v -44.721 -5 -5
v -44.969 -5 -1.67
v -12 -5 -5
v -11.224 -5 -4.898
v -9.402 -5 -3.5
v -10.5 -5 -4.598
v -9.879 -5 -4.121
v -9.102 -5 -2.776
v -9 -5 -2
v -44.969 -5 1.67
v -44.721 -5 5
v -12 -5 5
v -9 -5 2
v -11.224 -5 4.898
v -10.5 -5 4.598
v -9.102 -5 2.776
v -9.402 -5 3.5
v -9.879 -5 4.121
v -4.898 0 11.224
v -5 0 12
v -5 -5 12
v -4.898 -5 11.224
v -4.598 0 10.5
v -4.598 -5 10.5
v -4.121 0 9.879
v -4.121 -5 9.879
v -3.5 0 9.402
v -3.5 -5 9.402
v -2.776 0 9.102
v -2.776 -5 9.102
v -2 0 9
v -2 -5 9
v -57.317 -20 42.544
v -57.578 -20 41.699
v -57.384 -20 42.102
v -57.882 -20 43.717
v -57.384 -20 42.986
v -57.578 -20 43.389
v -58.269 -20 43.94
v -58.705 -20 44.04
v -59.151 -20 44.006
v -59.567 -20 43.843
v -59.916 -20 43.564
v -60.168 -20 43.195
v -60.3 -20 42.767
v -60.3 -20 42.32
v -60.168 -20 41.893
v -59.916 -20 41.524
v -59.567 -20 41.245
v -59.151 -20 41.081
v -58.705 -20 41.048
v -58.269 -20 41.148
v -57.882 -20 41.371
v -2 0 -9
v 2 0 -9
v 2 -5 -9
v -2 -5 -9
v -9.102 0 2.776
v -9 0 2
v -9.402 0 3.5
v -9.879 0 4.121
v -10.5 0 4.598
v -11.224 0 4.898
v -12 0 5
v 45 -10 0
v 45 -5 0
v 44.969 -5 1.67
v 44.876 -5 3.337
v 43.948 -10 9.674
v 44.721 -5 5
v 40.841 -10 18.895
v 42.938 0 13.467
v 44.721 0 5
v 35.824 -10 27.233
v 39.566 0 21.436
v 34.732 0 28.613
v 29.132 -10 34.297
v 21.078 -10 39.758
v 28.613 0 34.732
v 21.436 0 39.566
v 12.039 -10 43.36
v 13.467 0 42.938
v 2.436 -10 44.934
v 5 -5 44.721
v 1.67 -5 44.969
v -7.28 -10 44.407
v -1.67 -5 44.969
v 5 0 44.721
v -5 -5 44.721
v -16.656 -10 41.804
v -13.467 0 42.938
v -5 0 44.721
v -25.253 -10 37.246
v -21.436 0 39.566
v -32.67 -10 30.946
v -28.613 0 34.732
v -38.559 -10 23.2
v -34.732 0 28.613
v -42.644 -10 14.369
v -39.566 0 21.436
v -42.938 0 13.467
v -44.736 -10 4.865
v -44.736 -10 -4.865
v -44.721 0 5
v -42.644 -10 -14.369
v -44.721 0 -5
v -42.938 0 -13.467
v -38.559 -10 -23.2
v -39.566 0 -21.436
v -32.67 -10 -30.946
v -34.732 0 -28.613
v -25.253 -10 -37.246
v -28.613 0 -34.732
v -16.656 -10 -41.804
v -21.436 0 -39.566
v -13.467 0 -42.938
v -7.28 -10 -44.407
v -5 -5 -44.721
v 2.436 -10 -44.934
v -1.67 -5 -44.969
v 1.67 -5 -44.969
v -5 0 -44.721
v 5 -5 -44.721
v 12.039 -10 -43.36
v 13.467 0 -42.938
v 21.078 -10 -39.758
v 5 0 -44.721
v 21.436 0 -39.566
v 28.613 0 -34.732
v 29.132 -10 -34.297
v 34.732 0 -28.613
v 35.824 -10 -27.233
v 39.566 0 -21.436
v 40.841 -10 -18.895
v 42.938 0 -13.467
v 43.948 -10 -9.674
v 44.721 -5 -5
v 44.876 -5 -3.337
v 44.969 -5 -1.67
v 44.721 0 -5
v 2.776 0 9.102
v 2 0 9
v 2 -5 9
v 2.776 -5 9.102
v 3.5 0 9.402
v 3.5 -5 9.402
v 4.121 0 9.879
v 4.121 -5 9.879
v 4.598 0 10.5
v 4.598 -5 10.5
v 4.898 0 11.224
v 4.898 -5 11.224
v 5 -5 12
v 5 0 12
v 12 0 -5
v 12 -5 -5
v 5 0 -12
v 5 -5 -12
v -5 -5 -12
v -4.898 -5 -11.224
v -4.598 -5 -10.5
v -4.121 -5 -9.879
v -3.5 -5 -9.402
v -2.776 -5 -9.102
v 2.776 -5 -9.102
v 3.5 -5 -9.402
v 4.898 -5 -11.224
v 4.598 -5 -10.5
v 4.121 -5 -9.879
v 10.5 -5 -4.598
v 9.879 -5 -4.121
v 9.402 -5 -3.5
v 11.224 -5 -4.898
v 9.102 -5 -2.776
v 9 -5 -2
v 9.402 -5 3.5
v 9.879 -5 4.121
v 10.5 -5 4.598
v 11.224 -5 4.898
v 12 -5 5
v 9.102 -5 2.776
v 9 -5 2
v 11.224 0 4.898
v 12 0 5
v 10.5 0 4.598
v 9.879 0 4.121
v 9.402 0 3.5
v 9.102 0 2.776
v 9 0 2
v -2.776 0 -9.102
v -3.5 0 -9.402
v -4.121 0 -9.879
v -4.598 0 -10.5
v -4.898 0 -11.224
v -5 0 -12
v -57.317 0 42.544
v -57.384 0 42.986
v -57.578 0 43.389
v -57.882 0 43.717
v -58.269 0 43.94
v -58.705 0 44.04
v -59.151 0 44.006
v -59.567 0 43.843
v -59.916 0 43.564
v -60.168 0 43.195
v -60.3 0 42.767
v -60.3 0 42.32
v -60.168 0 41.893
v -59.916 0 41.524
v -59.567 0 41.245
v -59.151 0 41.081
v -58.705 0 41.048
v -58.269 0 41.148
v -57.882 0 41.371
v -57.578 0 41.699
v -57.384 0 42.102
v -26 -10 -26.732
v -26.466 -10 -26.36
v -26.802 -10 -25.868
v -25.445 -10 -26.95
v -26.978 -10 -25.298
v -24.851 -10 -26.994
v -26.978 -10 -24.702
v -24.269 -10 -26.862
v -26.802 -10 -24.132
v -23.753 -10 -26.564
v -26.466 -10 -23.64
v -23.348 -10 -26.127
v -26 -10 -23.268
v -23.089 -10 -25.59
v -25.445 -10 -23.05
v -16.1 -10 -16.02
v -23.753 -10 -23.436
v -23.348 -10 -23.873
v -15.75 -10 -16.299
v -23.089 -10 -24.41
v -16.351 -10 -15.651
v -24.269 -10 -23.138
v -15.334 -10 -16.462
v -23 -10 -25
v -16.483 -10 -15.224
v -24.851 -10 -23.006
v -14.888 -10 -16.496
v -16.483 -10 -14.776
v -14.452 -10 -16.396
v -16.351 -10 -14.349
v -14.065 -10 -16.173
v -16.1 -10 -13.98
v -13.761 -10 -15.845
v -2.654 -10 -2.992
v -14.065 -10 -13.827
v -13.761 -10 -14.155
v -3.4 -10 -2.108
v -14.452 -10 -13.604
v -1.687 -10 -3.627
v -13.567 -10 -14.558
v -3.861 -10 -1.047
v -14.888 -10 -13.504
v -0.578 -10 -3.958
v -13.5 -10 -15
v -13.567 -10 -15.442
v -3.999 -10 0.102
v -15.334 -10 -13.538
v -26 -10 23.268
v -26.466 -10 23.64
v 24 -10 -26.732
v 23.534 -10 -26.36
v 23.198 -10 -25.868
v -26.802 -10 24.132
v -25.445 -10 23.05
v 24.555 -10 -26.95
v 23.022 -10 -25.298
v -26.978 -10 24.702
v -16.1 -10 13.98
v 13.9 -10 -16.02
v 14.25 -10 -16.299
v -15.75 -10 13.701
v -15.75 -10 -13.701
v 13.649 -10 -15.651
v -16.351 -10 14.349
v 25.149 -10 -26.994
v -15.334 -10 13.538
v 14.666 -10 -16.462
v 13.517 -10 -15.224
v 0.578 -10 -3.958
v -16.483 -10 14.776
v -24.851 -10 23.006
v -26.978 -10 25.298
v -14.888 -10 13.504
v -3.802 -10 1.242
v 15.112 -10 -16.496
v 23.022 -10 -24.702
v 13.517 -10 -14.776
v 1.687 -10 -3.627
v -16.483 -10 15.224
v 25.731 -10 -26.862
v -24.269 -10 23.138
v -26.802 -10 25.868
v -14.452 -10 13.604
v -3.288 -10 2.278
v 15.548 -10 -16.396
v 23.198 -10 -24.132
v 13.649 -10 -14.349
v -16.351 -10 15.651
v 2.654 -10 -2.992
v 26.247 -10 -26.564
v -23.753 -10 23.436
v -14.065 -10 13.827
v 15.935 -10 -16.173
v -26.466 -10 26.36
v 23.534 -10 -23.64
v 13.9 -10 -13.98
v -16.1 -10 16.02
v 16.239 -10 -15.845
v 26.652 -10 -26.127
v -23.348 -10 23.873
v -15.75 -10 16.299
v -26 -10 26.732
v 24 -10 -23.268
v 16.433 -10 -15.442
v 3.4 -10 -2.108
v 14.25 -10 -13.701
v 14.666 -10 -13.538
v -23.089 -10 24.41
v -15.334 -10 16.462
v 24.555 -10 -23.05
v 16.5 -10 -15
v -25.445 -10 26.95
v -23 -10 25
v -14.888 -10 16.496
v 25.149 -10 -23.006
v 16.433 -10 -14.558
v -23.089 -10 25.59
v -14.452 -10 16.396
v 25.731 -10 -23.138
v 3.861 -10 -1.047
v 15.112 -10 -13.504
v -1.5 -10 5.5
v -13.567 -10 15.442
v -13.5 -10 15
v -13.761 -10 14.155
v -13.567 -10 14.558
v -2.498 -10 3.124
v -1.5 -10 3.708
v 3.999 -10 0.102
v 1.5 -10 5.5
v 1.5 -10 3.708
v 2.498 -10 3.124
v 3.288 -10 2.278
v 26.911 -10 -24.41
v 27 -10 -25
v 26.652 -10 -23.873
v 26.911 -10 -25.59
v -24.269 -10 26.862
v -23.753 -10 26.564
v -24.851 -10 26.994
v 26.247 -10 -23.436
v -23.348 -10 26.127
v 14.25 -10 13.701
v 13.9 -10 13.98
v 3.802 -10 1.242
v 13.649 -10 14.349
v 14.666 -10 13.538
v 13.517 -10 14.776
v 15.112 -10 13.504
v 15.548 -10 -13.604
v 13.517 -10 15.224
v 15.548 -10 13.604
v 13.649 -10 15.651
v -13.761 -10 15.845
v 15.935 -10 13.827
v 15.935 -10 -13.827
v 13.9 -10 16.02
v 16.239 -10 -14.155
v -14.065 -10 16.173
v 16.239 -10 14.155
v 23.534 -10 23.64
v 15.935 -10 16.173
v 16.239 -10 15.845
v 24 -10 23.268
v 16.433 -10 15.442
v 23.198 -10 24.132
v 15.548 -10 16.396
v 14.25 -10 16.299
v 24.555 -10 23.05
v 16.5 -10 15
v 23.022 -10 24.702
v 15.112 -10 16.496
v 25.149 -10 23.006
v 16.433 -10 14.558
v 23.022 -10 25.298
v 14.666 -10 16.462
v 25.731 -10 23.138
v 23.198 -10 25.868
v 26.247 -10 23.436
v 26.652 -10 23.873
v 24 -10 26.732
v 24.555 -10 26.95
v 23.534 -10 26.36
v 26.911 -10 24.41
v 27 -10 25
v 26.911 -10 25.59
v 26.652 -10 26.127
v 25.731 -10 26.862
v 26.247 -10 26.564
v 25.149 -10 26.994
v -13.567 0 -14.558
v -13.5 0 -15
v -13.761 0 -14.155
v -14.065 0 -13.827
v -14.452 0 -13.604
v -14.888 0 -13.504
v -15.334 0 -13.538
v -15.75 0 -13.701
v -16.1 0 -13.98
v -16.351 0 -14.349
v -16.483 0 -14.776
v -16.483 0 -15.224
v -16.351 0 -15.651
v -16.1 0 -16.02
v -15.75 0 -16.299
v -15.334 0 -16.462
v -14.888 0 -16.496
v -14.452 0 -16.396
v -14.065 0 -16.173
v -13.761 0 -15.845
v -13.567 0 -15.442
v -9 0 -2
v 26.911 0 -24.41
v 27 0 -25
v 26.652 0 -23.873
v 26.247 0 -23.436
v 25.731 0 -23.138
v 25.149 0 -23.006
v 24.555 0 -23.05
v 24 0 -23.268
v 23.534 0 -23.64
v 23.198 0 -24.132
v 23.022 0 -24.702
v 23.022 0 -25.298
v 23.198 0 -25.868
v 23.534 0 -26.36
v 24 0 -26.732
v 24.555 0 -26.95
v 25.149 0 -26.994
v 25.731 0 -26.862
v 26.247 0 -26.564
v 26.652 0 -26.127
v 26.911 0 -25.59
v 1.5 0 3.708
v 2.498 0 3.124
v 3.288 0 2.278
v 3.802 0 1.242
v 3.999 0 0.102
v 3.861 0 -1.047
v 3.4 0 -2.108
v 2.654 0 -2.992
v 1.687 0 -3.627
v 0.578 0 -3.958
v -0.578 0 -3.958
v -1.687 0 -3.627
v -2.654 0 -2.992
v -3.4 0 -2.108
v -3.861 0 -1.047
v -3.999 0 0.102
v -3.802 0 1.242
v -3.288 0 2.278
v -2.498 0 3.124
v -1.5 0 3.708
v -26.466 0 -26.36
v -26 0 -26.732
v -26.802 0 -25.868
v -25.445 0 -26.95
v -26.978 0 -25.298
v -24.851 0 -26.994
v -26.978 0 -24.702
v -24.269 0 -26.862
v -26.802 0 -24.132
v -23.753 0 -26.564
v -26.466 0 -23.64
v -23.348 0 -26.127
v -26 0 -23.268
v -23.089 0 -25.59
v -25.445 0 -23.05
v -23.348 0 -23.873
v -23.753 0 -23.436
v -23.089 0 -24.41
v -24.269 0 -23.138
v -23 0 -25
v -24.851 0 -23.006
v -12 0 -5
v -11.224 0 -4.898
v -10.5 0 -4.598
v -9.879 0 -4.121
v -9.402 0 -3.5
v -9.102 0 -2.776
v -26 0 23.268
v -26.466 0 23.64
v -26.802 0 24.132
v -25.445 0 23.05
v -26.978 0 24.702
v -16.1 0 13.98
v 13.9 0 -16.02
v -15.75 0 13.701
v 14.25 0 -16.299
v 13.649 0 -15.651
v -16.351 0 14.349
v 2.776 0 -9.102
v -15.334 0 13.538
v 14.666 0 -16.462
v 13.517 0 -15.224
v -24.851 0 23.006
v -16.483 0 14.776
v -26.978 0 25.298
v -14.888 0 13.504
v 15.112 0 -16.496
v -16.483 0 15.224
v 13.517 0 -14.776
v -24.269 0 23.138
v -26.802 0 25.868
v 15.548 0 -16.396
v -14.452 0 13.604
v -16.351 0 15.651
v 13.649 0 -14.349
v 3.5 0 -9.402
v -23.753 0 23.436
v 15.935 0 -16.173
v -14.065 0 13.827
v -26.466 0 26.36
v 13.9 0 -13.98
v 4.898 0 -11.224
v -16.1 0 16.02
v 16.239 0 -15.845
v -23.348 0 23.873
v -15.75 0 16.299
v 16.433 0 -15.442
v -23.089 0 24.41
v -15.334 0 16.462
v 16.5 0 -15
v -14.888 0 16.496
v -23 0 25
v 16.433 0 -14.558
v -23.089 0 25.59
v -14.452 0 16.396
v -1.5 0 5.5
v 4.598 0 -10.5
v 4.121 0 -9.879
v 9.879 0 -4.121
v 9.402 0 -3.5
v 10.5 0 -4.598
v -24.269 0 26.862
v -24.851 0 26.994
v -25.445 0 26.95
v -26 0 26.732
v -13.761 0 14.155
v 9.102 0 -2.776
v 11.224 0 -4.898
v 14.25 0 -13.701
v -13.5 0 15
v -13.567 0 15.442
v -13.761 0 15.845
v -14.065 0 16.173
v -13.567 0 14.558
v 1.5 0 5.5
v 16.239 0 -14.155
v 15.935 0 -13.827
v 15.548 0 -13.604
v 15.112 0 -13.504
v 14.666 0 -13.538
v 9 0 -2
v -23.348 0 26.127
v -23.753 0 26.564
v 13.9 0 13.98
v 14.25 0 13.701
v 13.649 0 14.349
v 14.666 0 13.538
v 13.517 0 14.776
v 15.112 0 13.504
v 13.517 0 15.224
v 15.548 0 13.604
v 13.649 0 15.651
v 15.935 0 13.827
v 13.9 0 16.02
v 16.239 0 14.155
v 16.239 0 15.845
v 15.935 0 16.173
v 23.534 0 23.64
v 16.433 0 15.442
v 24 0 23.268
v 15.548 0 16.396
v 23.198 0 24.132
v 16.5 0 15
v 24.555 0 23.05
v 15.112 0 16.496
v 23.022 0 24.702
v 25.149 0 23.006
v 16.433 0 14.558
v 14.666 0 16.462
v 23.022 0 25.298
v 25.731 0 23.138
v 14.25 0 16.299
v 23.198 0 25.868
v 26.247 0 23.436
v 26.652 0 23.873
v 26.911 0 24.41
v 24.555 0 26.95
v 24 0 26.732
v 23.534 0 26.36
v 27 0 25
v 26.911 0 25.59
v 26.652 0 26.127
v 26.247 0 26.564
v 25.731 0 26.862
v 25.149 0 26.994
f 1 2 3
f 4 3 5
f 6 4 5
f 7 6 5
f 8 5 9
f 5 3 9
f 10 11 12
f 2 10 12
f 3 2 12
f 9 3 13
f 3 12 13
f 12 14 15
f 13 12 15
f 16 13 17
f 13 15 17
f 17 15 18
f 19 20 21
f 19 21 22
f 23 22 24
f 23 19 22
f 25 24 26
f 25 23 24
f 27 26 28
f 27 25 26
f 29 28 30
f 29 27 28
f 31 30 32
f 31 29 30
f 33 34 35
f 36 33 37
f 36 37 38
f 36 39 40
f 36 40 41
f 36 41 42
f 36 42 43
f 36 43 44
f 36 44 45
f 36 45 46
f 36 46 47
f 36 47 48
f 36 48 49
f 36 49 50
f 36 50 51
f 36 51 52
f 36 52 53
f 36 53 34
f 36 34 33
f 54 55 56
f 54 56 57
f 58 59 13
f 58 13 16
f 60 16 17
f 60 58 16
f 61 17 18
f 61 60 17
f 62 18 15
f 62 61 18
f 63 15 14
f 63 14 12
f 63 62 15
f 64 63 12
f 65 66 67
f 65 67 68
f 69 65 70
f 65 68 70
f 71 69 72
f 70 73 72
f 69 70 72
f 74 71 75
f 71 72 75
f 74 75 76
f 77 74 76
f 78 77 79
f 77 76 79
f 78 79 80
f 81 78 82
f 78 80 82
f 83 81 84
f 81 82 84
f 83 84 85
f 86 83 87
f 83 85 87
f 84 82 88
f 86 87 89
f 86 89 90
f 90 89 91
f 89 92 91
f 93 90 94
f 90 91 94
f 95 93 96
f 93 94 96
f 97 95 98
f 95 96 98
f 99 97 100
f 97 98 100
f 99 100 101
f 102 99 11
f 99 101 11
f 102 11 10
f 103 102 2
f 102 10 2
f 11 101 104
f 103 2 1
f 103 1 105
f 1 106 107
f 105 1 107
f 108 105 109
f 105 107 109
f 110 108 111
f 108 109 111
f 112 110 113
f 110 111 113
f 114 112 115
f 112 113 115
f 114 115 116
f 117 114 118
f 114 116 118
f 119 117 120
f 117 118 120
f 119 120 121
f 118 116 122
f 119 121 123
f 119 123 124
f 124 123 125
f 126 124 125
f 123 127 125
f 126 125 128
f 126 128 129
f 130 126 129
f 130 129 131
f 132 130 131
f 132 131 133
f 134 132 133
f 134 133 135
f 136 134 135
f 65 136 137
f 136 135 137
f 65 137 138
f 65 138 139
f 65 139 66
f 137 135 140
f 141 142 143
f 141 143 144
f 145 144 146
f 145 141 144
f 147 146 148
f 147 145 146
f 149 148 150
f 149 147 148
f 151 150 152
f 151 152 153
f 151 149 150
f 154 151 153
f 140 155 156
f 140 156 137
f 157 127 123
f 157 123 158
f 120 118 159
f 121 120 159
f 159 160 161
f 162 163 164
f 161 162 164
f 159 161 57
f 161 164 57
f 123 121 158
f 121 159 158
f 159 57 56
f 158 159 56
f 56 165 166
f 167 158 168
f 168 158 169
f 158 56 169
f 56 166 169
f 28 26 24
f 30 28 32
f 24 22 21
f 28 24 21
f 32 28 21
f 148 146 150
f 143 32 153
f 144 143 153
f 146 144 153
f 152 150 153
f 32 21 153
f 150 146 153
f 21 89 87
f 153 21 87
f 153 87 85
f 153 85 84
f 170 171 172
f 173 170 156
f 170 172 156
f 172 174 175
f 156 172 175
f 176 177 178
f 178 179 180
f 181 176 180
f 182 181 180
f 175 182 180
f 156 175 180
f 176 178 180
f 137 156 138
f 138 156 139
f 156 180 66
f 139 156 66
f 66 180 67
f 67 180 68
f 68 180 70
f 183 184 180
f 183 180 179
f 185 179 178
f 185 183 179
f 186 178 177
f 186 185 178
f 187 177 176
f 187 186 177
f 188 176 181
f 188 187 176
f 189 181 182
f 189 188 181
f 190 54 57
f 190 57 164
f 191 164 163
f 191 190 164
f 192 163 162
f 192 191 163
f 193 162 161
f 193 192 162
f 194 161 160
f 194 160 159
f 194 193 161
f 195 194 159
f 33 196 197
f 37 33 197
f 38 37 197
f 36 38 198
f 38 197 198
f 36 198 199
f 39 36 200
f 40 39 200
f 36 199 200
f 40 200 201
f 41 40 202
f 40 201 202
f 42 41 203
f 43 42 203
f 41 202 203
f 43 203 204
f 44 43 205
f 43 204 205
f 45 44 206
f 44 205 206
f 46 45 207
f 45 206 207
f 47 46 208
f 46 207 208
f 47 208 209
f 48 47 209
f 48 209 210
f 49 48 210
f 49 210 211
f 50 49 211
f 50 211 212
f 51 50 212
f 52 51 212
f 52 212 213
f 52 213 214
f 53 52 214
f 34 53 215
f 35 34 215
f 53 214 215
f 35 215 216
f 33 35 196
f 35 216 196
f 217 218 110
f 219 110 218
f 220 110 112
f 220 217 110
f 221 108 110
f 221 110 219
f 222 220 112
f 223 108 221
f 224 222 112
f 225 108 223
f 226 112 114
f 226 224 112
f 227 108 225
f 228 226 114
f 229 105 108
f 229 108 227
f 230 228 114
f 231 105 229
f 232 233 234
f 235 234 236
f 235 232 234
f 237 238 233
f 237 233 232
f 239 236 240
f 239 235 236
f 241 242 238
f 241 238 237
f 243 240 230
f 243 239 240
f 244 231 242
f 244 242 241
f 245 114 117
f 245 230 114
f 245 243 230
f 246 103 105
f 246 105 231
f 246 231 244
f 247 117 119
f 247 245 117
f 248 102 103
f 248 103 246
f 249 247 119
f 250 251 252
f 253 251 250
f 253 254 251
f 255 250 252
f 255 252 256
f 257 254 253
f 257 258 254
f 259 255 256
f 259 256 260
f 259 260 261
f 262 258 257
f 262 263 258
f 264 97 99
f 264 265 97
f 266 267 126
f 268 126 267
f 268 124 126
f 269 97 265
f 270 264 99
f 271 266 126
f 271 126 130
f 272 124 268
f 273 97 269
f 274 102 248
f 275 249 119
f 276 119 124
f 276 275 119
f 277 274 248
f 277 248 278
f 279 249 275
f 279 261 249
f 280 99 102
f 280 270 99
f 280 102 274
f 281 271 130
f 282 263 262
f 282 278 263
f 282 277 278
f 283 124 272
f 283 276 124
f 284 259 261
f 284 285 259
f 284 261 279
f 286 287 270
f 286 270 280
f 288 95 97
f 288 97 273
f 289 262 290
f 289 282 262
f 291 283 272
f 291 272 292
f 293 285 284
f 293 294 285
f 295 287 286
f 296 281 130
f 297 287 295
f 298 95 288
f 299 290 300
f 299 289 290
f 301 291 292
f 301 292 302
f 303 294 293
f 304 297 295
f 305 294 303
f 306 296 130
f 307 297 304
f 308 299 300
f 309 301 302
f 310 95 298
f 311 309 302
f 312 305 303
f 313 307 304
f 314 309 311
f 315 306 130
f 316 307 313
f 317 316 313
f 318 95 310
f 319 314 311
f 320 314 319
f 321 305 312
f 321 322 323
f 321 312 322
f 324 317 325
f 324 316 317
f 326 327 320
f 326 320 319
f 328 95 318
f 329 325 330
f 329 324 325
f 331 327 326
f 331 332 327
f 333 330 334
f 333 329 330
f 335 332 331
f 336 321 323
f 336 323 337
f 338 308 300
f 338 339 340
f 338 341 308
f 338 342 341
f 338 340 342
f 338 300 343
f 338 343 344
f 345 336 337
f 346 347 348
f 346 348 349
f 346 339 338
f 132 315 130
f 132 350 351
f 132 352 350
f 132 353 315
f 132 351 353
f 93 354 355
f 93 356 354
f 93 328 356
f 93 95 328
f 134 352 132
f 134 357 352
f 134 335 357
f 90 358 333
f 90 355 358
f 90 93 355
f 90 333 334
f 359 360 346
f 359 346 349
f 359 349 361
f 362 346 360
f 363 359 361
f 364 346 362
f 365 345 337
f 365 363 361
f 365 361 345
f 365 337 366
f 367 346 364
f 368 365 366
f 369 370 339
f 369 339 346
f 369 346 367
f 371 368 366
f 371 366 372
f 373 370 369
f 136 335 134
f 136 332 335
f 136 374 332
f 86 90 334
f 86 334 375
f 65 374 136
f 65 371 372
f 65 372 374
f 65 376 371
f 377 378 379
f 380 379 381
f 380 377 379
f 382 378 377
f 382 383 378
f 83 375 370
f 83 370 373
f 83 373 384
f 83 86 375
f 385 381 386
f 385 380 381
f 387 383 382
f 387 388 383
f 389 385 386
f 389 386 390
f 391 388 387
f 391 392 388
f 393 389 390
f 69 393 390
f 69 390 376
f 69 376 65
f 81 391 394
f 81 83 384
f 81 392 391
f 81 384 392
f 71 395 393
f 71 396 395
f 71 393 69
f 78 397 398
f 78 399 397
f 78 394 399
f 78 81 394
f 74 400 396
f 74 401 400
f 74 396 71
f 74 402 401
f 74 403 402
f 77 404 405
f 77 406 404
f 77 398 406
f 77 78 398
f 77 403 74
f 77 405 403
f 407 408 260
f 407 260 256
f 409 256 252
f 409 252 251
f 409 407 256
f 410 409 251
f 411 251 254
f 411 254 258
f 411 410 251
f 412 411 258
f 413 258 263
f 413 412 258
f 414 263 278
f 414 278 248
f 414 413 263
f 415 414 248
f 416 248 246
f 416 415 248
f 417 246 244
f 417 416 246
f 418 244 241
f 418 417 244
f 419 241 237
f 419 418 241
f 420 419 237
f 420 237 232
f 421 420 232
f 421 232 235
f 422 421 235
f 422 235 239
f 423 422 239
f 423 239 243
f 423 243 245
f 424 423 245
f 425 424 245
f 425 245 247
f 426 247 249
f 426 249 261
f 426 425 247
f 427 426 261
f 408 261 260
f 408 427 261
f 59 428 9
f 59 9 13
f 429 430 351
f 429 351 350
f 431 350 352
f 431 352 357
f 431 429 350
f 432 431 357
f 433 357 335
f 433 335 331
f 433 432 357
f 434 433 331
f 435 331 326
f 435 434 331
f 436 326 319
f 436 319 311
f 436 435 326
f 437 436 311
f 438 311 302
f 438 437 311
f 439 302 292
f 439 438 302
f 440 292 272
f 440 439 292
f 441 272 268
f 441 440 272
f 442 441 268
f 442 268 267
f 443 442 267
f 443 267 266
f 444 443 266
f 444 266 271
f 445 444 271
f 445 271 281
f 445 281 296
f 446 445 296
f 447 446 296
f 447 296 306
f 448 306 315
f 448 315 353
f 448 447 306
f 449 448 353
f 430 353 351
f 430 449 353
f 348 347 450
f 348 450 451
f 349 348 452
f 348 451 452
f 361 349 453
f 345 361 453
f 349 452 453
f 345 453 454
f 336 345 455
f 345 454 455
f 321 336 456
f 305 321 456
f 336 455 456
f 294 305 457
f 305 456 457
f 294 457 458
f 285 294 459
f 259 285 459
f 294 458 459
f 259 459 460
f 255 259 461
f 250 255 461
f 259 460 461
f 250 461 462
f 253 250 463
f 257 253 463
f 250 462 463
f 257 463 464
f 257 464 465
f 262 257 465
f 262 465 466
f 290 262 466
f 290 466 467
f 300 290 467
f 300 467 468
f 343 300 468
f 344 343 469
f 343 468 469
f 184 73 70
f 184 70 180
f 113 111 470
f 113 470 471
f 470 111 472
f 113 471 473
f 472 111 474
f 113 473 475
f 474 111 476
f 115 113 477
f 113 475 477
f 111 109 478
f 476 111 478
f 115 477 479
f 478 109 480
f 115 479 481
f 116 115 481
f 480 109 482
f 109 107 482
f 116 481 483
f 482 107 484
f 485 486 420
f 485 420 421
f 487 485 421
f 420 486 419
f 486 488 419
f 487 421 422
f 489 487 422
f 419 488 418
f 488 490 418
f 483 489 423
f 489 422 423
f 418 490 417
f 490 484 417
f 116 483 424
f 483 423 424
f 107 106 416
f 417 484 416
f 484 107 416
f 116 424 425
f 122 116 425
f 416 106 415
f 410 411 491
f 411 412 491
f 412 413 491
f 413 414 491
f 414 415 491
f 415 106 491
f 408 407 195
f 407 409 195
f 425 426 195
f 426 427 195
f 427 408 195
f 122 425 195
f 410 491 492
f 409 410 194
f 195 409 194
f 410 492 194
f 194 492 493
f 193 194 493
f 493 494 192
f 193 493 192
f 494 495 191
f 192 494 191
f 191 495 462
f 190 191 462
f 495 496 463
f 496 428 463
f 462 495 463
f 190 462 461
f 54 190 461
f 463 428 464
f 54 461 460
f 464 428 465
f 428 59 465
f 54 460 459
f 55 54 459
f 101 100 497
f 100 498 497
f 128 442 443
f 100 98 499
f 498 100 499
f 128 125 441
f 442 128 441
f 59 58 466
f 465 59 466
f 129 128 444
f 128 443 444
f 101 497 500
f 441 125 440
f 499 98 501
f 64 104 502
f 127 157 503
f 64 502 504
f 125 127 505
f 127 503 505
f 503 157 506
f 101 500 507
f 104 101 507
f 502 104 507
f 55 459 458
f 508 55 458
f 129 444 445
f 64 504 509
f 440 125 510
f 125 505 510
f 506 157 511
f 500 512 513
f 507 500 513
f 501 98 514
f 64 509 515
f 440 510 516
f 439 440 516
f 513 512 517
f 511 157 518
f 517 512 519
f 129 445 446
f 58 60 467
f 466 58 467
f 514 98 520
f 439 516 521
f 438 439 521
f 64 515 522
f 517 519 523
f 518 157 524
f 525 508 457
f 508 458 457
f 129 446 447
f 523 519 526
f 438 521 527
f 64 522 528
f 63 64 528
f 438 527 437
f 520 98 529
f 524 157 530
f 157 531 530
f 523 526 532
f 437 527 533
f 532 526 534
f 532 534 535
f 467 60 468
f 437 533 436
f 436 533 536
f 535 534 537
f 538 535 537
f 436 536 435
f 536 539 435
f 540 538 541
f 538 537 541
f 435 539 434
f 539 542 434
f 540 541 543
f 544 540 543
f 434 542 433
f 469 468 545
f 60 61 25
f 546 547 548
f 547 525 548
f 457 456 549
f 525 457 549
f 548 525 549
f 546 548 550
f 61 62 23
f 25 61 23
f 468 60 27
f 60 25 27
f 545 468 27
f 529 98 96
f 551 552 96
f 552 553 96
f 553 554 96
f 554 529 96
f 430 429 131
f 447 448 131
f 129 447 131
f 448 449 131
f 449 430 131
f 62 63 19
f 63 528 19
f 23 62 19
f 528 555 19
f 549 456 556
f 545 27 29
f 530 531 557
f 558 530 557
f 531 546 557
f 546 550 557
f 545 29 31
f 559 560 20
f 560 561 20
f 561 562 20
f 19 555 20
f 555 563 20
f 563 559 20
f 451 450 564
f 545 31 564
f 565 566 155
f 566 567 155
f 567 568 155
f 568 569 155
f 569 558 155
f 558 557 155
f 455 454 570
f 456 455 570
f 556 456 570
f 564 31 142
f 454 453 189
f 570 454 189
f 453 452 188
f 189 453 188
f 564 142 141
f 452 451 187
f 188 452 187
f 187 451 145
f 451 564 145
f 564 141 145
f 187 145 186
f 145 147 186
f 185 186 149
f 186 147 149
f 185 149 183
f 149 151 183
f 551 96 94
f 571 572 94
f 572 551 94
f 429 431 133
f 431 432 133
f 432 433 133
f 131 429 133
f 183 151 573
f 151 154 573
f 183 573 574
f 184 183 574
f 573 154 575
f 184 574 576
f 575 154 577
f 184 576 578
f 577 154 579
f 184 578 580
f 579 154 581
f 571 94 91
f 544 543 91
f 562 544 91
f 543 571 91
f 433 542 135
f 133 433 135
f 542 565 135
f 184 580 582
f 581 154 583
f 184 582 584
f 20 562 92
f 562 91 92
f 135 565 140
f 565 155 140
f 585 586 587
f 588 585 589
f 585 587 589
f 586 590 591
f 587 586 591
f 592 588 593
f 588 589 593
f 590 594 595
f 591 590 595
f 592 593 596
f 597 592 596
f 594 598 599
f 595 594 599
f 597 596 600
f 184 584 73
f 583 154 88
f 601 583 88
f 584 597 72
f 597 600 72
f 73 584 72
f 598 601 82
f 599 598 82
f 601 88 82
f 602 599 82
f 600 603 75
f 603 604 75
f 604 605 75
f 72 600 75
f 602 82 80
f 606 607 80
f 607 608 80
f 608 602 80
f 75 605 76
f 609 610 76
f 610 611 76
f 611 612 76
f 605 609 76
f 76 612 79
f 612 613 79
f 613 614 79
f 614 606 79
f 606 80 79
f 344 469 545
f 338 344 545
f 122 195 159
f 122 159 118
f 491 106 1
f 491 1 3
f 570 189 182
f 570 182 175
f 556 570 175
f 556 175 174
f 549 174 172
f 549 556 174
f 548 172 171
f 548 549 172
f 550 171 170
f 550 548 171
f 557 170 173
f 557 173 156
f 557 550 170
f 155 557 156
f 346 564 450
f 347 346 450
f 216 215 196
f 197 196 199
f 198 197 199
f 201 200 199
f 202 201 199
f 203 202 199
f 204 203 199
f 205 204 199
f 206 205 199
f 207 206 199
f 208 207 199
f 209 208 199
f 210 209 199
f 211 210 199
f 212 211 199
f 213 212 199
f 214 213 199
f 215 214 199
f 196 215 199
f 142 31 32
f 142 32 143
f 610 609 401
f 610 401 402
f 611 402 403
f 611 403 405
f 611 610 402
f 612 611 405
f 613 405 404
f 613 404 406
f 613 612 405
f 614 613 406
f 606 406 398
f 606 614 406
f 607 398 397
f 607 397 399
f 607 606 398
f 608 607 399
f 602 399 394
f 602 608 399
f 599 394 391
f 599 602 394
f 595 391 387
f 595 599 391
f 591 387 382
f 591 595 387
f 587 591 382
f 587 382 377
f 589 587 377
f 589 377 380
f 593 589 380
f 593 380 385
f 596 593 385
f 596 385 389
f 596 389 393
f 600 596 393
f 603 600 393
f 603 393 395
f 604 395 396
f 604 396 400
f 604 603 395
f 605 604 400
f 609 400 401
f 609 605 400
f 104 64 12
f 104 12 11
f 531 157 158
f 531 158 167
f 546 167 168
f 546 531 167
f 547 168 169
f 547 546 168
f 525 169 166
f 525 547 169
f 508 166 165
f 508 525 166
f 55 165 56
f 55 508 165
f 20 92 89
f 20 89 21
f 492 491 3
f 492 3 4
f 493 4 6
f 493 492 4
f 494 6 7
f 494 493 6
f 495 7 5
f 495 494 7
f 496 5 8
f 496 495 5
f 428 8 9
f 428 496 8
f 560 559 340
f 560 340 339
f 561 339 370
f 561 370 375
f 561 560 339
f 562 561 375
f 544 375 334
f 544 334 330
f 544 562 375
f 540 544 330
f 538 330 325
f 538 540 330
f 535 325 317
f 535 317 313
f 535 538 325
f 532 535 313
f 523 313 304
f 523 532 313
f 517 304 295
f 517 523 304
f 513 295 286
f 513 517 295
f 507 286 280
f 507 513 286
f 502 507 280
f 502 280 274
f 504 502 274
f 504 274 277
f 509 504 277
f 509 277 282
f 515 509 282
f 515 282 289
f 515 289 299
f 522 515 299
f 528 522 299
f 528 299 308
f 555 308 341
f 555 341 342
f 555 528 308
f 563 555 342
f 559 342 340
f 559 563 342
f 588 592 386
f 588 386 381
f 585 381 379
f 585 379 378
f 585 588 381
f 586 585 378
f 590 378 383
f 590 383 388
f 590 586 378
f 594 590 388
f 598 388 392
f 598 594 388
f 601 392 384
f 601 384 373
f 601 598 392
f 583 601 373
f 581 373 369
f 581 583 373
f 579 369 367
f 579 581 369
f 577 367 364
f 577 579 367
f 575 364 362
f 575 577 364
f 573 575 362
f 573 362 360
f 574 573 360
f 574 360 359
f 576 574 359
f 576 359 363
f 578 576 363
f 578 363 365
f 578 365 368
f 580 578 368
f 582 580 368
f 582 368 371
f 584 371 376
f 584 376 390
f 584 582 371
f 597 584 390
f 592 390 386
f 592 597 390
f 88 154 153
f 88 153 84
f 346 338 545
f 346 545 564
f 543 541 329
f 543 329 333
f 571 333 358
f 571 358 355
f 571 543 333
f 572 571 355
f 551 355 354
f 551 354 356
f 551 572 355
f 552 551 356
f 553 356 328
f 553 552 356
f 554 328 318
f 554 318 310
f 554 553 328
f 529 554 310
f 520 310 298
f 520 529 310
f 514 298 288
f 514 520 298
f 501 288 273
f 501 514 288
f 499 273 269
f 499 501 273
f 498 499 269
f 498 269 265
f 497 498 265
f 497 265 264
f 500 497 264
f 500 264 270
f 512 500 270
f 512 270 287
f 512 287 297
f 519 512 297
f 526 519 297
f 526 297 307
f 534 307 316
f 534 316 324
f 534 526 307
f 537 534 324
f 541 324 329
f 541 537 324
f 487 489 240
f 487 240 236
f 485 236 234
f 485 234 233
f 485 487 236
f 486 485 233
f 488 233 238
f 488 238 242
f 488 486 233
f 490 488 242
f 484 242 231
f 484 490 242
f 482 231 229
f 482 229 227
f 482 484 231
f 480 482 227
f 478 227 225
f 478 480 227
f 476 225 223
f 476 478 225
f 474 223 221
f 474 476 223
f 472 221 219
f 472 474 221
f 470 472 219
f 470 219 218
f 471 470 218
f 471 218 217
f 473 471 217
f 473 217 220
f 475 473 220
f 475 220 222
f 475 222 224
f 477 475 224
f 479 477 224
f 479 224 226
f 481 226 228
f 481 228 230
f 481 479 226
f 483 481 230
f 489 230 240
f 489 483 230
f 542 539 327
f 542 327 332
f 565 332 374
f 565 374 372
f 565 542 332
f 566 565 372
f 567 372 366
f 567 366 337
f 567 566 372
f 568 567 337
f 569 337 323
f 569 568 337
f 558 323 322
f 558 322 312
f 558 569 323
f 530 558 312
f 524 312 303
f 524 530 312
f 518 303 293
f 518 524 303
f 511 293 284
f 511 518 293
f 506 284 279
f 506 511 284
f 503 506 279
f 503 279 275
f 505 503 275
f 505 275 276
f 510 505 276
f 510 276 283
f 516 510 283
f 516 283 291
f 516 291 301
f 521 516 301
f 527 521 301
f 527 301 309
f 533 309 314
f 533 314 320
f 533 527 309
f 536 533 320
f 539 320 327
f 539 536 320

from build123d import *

# Parameters (mm, degrees)
F0_R     = 45
F0_R_2   = 2
F0_R_3   = 1.5
F1_DEPTH = 10
F3_DEPTH = 5
F4_R     = 1.5
F5_DEPTH = 20


with BuildPart() as f1:
    # F0 (on Front) → F1 (new body)
    with BuildSketch(Plane.XZ):
        Circle(F0_R)
        with Locations((-25, -25)):
            Circle(F0_R_2, mode=Mode.SUBTRACT)
        with Locations((-15, -15)):
            Circle(F0_R_3, mode=Mode.SUBTRACT)
        with Locations((25, -25)):
            Circle(F0_R_2, mode=Mode.SUBTRACT)
        with Locations((15, -15)):
            Circle(F0_R_3, mode=Mode.SUBTRACT)
        with BuildLine():
            ThreePointArc((1.5, 3.708099), (0, -4), (-1.5, 3.708099))
            Line((-1.5, 3.708099), (-1.5, 5.5))
            Line((-1.5, 5.5), (1.5, 5.5))
            Line((1.5, 5.5), (1.5, 3.708099))
        make_face(mode=Mode.SUBTRACT)
        with Locations((-15, 15)):
            Circle(F0_R_3, mode=Mode.SUBTRACT)
        with Locations((-25, 25)):
            Circle(F0_R_2, mode=Mode.SUBTRACT)
        with Locations((15, 15)):
            Circle(F0_R_3, mode=Mode.SUBTRACT)
        with Locations((25, 25)):
            Circle(F0_R_2, mode=Mode.SUBTRACT)
    extrude(amount=F1_DEPTH)

    # F2 (on Front) → F3 (cut)
    with BuildSketch(Plane.XZ):
        with BuildLine():
            Line((45, 5), (12, 5))
            ThreePointArc((12, 5), (9.87868, 4.12132), (9, 2))
            Line((9, 2), (9, -2))
            ThreePointArc((9, -2), (9.87868, -4.12132), (12, -5))
            Line((12, -5), (45, -5))
            Line((45, -5), (45, 5))
        make_face()
        with BuildLine():
            Line((-5, 45), (-5, 12))
            ThreePointArc((-5, 12), (-4.12132, 9.87868), (-2, 9))
            Line((-2, 9), (2, 9))
            ThreePointArc((2, 9), (4.12132, 9.87868), (5, 12))
            Line((5, 12), (5, 45))
            Line((5, 45), (-5, 45))
        make_face()
        with BuildLine():
            Line((-45, -5), (-12, -5))
            ThreePointArc((-12, -5), (-9.87868, -4.12132), (-9, -2))
            Line((-9, -2), (-9, 2))
            ThreePointArc((-9, 2), (-9.87868, 4.12132), (-12, 5))
            Line((-12, 5), (-45, 5))
            Line((-45, 5), (-45, -5))
        make_face()
        with BuildLine():
            Line((5, -45), (5, -12))
            ThreePointArc((5, -12), (4.12132, -9.87868), (2, -9))
            Line((2, -9), (-2, -9))
            ThreePointArc((-2, -9), (-4.12132, -9.87868), (-5, -12))
            Line((-5, -12), (-5, -45))
            Line((-5, -45), (5, -45))
        make_face()
    extrude(amount=F3_DEPTH, mode=Mode.SUBTRACT)


with BuildPart() as f5:
    # F4 (on Front) → F5 (new body)
    with BuildSketch(Plane.XZ):
        with Locations((-58.816873, 42.543855)):
            Circle(F4_R)
    extrude(amount=F5_DEPTH)


solid = Compound([f1.part, f5.part])
